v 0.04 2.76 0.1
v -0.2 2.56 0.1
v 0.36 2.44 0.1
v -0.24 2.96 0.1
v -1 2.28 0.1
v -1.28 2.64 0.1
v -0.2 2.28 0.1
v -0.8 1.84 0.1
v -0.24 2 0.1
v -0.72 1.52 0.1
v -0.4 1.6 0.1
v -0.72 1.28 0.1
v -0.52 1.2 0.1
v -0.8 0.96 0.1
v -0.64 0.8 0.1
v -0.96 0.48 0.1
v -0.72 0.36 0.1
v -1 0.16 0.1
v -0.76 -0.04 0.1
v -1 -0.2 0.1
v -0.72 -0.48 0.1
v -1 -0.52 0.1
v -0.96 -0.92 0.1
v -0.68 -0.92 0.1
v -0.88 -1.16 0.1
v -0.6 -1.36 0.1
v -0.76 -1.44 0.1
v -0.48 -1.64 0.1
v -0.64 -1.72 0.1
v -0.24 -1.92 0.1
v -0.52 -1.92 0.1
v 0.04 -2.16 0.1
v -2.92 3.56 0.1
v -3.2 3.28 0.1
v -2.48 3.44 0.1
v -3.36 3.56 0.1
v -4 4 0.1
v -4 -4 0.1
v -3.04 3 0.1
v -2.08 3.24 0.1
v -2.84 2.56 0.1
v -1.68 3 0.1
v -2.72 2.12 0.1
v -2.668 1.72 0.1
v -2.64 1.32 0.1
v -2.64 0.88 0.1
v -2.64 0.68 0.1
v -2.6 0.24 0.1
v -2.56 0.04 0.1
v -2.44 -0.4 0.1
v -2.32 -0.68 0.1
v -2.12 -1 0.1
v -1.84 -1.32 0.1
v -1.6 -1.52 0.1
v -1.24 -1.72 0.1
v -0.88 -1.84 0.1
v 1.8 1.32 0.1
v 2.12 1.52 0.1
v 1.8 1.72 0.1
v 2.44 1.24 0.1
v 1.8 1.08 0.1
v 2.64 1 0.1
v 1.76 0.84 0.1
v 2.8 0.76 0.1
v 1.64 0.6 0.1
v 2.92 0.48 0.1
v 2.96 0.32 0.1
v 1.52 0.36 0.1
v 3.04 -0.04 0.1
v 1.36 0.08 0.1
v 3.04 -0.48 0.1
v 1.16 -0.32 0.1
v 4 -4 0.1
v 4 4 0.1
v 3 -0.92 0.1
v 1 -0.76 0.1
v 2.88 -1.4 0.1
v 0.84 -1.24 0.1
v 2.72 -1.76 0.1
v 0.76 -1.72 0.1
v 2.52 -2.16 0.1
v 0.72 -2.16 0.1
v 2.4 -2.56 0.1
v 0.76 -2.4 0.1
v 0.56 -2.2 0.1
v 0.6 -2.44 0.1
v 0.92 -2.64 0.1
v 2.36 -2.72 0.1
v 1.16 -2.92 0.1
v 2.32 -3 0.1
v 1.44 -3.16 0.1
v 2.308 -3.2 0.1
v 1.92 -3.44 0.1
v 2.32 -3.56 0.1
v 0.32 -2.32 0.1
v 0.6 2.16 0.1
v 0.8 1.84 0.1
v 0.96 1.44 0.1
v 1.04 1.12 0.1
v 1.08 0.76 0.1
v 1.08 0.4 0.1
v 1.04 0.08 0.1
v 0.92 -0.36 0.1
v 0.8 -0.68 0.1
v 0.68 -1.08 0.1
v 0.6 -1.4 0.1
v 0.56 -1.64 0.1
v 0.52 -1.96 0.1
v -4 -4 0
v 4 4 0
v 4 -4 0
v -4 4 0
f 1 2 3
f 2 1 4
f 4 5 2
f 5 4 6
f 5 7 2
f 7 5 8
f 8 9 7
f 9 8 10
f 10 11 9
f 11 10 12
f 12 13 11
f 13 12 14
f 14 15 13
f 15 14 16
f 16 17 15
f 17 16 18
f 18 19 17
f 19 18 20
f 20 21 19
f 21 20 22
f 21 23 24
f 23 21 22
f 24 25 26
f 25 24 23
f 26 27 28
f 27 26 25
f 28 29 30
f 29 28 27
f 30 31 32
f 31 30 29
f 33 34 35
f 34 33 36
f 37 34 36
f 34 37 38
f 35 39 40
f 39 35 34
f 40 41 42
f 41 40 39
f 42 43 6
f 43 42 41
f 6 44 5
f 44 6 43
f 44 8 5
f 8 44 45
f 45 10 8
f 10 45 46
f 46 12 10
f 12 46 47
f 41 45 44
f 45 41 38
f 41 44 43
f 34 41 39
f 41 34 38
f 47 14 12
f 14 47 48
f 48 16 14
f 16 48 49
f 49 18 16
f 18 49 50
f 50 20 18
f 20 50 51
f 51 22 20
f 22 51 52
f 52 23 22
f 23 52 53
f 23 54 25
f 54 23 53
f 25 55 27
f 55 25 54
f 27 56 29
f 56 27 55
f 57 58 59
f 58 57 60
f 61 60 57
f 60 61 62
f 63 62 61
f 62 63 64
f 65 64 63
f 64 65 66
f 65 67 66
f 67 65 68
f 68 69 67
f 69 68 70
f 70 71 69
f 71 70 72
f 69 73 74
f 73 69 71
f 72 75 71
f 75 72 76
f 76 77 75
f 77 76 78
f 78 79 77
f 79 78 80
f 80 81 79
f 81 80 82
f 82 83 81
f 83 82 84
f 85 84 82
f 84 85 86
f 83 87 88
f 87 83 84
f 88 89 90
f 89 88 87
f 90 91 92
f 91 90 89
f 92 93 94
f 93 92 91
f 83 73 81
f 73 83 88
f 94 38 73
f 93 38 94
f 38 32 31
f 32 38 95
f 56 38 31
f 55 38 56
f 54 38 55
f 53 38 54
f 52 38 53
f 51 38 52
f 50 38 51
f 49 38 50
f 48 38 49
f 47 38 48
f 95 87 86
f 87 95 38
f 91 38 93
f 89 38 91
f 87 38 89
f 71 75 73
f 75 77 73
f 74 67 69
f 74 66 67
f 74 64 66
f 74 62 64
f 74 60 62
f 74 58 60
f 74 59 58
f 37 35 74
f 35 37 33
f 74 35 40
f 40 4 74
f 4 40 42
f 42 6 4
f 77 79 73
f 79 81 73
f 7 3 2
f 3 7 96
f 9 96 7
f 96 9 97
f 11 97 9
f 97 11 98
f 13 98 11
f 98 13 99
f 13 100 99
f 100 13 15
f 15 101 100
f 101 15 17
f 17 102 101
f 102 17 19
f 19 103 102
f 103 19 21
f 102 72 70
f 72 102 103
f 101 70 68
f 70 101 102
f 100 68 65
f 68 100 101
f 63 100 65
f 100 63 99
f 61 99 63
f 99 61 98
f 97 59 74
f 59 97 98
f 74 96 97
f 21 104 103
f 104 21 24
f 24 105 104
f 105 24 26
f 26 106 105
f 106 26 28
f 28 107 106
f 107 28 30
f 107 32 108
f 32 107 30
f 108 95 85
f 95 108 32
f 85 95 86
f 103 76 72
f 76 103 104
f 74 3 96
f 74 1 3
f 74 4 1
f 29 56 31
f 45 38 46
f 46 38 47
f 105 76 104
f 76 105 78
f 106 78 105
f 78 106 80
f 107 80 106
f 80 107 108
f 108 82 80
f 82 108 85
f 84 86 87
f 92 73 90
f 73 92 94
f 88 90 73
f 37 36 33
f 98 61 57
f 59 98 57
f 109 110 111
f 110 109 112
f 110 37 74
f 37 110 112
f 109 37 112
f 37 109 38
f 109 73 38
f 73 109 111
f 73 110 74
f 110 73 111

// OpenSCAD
// file: ../p/box5-12.scad
use <../lib.scad>
function ldraw_lib__box5_12() = [
// 0 Box with 5 Faces without Any Edges
// 0 Name: box5-12.dat
// 0 Author: Chris Dee [cwdee]
// 0 !LDRAW_ORG Primitive UPDATE 2009-02
// 0 !LICENSE Licensed under CC BY 4.0 : see CAreadme.txt
// 
// 0 BFC CERTIFY CCW
  [0,"BFC","CERTIFY"],
  [0,"BFC","CCW"],
// 
// 0 !HISTORY 2009-09-03 [PTadmin] Official Update 2009-02
// 
// 
// 4 16 1 1 1 1 1 -1 -1 1 -1 -1 1 1
  [4,16,1,1,1,1,1,-1,-1,1,-1,-1,1,1],
// 4 16 -1 0 1 1 0 1 1 1 1 -1 1 1
  [4,16,-1,0,1,1,0,1,1,1,1,-1,1,1],
// 4 16 -1 0 -1 -1 0 1 -1 1 1 -1 1 -1
  [4,16,-1,0,-1,-1,0,1,-1,1,1,-1,1,-1],
// 4 16 1 0 -1 -1 0 -1 -1 1 -1 1 1 -1
  [4,16,1,0,-1,-1,0,-1,-1,1,-1,1,1,-1],
// 4 16 1 0 1 1 0 -1 1 1 -1 1 1 1
  [4,16,1,0,1,1,0,-1,1,1,-1,1,1,1],
// 0
];
module ldraw_lib__box5_12(step=0, col=false, unit=2/5, alt=false, line=0.2, solid=!$preview)
    makepoly(ldraw_lib__box5_12(), step=step, col=col, unit=unit, alt=alt, line=line, solid=solid);
ldraw_lib__box5_12(line=0.2);
// file: 004659a.scad
use <../lib.scad>
use <../p/box5-12.scad>
use <s/004659as01.scad>
function ldraw_lib__004659a() = [
// 0 Sticker  1 x  1 Fire Emblem
// 0 Name: 004659a.dat
// 0 Author: Alex Taylor [anathema]
// 0 !LDRAW_ORG Part UPDATE 2013-01
// 0 !LICENSE Licensed under CC BY 4.0 : see CAreadme.txt
// 
// 0 BFC CERTIFY CCW
  [0,"BFC","CERTIFY"],
  [0,"BFC","CCW"],
// 
// 0 !HISTORY 2013-03-17 [MagFors] Used box primitive
// 0 !HISTORY 2013-07-21 [PTadmin] Official Update 2013-01
// 
// 
// 1 16 0 -0.25 0 1 0 0 0 1 0 0 0 1 s\004659as01.dat
  [1,16,0,-0.25,0,1,0,0,0,1,0,0,0,1, ldraw_lib__s__004659as01()],
// 1 16 0 -0.25 0 10 0 0 0 0.25 0 0 0 10 box5-12.dat
  [1,16,0,-0.25,0,10,0,0,0,0.25,0,0,0,10, ldraw_lib__box5_12()],
];
module ldraw_lib__004659a(step=0, col=false, unit=2/5, alt=false, line=0.2, solid=!$preview)
    makepoly(ldraw_lib__004659a(), step=step, col=col, unit=unit, alt=alt, line=line, solid=solid);
ldraw_lib__004659a(line=0.2);
// main file
use <../lib.scad>
use <004659a.scad>
function ldraw_lib__004452e() = [
// 0 =Sticker  1 x  1 Fire Emblem
// 0 Name: 004452e.dat
// 0 Author: Takeshi Takahashi [RainbowDolphin]
// 0 !LDRAW_ORG Part Alias UPDATE 2024-05
// 0 !LICENSE Licensed under CC BY 4.0 : see CAreadme.txt
// 
// 0 BFC CERTIFY CCW
  [0,"BFC","CERTIFY"],
  [0,"BFC","CCW"],
// 
// 0 !KEYWORDS Bricklink 374.1stk01, Brickowl 954932, Fire engine, Fire Station
// 0 !KEYWORDS Rebrickable 4452stk, Set 374-1
// 
// 0 !HISTORY 2024-06-30 [OrionP] Official Update 2024-05
// 
// 
// 0 // Alias of 004659a
// 1 16 0 0 0 1 0 0 0 1 0 0 0 1 004659a.dat
  [1,16,0,0,0,1,0,0,0,1,0,0,0,1, ldraw_lib__004659a()],
];
module ldraw_lib__004452e(step=0, col=false, unit=2/5, alt=false, line=0.2, solid=!$preview)
    makepoly(ldraw_lib__004452e(), step=step, col=col, unit=unit, alt=alt, line=line, solid=solid);
ldraw_lib__004452e(line=0.2);
